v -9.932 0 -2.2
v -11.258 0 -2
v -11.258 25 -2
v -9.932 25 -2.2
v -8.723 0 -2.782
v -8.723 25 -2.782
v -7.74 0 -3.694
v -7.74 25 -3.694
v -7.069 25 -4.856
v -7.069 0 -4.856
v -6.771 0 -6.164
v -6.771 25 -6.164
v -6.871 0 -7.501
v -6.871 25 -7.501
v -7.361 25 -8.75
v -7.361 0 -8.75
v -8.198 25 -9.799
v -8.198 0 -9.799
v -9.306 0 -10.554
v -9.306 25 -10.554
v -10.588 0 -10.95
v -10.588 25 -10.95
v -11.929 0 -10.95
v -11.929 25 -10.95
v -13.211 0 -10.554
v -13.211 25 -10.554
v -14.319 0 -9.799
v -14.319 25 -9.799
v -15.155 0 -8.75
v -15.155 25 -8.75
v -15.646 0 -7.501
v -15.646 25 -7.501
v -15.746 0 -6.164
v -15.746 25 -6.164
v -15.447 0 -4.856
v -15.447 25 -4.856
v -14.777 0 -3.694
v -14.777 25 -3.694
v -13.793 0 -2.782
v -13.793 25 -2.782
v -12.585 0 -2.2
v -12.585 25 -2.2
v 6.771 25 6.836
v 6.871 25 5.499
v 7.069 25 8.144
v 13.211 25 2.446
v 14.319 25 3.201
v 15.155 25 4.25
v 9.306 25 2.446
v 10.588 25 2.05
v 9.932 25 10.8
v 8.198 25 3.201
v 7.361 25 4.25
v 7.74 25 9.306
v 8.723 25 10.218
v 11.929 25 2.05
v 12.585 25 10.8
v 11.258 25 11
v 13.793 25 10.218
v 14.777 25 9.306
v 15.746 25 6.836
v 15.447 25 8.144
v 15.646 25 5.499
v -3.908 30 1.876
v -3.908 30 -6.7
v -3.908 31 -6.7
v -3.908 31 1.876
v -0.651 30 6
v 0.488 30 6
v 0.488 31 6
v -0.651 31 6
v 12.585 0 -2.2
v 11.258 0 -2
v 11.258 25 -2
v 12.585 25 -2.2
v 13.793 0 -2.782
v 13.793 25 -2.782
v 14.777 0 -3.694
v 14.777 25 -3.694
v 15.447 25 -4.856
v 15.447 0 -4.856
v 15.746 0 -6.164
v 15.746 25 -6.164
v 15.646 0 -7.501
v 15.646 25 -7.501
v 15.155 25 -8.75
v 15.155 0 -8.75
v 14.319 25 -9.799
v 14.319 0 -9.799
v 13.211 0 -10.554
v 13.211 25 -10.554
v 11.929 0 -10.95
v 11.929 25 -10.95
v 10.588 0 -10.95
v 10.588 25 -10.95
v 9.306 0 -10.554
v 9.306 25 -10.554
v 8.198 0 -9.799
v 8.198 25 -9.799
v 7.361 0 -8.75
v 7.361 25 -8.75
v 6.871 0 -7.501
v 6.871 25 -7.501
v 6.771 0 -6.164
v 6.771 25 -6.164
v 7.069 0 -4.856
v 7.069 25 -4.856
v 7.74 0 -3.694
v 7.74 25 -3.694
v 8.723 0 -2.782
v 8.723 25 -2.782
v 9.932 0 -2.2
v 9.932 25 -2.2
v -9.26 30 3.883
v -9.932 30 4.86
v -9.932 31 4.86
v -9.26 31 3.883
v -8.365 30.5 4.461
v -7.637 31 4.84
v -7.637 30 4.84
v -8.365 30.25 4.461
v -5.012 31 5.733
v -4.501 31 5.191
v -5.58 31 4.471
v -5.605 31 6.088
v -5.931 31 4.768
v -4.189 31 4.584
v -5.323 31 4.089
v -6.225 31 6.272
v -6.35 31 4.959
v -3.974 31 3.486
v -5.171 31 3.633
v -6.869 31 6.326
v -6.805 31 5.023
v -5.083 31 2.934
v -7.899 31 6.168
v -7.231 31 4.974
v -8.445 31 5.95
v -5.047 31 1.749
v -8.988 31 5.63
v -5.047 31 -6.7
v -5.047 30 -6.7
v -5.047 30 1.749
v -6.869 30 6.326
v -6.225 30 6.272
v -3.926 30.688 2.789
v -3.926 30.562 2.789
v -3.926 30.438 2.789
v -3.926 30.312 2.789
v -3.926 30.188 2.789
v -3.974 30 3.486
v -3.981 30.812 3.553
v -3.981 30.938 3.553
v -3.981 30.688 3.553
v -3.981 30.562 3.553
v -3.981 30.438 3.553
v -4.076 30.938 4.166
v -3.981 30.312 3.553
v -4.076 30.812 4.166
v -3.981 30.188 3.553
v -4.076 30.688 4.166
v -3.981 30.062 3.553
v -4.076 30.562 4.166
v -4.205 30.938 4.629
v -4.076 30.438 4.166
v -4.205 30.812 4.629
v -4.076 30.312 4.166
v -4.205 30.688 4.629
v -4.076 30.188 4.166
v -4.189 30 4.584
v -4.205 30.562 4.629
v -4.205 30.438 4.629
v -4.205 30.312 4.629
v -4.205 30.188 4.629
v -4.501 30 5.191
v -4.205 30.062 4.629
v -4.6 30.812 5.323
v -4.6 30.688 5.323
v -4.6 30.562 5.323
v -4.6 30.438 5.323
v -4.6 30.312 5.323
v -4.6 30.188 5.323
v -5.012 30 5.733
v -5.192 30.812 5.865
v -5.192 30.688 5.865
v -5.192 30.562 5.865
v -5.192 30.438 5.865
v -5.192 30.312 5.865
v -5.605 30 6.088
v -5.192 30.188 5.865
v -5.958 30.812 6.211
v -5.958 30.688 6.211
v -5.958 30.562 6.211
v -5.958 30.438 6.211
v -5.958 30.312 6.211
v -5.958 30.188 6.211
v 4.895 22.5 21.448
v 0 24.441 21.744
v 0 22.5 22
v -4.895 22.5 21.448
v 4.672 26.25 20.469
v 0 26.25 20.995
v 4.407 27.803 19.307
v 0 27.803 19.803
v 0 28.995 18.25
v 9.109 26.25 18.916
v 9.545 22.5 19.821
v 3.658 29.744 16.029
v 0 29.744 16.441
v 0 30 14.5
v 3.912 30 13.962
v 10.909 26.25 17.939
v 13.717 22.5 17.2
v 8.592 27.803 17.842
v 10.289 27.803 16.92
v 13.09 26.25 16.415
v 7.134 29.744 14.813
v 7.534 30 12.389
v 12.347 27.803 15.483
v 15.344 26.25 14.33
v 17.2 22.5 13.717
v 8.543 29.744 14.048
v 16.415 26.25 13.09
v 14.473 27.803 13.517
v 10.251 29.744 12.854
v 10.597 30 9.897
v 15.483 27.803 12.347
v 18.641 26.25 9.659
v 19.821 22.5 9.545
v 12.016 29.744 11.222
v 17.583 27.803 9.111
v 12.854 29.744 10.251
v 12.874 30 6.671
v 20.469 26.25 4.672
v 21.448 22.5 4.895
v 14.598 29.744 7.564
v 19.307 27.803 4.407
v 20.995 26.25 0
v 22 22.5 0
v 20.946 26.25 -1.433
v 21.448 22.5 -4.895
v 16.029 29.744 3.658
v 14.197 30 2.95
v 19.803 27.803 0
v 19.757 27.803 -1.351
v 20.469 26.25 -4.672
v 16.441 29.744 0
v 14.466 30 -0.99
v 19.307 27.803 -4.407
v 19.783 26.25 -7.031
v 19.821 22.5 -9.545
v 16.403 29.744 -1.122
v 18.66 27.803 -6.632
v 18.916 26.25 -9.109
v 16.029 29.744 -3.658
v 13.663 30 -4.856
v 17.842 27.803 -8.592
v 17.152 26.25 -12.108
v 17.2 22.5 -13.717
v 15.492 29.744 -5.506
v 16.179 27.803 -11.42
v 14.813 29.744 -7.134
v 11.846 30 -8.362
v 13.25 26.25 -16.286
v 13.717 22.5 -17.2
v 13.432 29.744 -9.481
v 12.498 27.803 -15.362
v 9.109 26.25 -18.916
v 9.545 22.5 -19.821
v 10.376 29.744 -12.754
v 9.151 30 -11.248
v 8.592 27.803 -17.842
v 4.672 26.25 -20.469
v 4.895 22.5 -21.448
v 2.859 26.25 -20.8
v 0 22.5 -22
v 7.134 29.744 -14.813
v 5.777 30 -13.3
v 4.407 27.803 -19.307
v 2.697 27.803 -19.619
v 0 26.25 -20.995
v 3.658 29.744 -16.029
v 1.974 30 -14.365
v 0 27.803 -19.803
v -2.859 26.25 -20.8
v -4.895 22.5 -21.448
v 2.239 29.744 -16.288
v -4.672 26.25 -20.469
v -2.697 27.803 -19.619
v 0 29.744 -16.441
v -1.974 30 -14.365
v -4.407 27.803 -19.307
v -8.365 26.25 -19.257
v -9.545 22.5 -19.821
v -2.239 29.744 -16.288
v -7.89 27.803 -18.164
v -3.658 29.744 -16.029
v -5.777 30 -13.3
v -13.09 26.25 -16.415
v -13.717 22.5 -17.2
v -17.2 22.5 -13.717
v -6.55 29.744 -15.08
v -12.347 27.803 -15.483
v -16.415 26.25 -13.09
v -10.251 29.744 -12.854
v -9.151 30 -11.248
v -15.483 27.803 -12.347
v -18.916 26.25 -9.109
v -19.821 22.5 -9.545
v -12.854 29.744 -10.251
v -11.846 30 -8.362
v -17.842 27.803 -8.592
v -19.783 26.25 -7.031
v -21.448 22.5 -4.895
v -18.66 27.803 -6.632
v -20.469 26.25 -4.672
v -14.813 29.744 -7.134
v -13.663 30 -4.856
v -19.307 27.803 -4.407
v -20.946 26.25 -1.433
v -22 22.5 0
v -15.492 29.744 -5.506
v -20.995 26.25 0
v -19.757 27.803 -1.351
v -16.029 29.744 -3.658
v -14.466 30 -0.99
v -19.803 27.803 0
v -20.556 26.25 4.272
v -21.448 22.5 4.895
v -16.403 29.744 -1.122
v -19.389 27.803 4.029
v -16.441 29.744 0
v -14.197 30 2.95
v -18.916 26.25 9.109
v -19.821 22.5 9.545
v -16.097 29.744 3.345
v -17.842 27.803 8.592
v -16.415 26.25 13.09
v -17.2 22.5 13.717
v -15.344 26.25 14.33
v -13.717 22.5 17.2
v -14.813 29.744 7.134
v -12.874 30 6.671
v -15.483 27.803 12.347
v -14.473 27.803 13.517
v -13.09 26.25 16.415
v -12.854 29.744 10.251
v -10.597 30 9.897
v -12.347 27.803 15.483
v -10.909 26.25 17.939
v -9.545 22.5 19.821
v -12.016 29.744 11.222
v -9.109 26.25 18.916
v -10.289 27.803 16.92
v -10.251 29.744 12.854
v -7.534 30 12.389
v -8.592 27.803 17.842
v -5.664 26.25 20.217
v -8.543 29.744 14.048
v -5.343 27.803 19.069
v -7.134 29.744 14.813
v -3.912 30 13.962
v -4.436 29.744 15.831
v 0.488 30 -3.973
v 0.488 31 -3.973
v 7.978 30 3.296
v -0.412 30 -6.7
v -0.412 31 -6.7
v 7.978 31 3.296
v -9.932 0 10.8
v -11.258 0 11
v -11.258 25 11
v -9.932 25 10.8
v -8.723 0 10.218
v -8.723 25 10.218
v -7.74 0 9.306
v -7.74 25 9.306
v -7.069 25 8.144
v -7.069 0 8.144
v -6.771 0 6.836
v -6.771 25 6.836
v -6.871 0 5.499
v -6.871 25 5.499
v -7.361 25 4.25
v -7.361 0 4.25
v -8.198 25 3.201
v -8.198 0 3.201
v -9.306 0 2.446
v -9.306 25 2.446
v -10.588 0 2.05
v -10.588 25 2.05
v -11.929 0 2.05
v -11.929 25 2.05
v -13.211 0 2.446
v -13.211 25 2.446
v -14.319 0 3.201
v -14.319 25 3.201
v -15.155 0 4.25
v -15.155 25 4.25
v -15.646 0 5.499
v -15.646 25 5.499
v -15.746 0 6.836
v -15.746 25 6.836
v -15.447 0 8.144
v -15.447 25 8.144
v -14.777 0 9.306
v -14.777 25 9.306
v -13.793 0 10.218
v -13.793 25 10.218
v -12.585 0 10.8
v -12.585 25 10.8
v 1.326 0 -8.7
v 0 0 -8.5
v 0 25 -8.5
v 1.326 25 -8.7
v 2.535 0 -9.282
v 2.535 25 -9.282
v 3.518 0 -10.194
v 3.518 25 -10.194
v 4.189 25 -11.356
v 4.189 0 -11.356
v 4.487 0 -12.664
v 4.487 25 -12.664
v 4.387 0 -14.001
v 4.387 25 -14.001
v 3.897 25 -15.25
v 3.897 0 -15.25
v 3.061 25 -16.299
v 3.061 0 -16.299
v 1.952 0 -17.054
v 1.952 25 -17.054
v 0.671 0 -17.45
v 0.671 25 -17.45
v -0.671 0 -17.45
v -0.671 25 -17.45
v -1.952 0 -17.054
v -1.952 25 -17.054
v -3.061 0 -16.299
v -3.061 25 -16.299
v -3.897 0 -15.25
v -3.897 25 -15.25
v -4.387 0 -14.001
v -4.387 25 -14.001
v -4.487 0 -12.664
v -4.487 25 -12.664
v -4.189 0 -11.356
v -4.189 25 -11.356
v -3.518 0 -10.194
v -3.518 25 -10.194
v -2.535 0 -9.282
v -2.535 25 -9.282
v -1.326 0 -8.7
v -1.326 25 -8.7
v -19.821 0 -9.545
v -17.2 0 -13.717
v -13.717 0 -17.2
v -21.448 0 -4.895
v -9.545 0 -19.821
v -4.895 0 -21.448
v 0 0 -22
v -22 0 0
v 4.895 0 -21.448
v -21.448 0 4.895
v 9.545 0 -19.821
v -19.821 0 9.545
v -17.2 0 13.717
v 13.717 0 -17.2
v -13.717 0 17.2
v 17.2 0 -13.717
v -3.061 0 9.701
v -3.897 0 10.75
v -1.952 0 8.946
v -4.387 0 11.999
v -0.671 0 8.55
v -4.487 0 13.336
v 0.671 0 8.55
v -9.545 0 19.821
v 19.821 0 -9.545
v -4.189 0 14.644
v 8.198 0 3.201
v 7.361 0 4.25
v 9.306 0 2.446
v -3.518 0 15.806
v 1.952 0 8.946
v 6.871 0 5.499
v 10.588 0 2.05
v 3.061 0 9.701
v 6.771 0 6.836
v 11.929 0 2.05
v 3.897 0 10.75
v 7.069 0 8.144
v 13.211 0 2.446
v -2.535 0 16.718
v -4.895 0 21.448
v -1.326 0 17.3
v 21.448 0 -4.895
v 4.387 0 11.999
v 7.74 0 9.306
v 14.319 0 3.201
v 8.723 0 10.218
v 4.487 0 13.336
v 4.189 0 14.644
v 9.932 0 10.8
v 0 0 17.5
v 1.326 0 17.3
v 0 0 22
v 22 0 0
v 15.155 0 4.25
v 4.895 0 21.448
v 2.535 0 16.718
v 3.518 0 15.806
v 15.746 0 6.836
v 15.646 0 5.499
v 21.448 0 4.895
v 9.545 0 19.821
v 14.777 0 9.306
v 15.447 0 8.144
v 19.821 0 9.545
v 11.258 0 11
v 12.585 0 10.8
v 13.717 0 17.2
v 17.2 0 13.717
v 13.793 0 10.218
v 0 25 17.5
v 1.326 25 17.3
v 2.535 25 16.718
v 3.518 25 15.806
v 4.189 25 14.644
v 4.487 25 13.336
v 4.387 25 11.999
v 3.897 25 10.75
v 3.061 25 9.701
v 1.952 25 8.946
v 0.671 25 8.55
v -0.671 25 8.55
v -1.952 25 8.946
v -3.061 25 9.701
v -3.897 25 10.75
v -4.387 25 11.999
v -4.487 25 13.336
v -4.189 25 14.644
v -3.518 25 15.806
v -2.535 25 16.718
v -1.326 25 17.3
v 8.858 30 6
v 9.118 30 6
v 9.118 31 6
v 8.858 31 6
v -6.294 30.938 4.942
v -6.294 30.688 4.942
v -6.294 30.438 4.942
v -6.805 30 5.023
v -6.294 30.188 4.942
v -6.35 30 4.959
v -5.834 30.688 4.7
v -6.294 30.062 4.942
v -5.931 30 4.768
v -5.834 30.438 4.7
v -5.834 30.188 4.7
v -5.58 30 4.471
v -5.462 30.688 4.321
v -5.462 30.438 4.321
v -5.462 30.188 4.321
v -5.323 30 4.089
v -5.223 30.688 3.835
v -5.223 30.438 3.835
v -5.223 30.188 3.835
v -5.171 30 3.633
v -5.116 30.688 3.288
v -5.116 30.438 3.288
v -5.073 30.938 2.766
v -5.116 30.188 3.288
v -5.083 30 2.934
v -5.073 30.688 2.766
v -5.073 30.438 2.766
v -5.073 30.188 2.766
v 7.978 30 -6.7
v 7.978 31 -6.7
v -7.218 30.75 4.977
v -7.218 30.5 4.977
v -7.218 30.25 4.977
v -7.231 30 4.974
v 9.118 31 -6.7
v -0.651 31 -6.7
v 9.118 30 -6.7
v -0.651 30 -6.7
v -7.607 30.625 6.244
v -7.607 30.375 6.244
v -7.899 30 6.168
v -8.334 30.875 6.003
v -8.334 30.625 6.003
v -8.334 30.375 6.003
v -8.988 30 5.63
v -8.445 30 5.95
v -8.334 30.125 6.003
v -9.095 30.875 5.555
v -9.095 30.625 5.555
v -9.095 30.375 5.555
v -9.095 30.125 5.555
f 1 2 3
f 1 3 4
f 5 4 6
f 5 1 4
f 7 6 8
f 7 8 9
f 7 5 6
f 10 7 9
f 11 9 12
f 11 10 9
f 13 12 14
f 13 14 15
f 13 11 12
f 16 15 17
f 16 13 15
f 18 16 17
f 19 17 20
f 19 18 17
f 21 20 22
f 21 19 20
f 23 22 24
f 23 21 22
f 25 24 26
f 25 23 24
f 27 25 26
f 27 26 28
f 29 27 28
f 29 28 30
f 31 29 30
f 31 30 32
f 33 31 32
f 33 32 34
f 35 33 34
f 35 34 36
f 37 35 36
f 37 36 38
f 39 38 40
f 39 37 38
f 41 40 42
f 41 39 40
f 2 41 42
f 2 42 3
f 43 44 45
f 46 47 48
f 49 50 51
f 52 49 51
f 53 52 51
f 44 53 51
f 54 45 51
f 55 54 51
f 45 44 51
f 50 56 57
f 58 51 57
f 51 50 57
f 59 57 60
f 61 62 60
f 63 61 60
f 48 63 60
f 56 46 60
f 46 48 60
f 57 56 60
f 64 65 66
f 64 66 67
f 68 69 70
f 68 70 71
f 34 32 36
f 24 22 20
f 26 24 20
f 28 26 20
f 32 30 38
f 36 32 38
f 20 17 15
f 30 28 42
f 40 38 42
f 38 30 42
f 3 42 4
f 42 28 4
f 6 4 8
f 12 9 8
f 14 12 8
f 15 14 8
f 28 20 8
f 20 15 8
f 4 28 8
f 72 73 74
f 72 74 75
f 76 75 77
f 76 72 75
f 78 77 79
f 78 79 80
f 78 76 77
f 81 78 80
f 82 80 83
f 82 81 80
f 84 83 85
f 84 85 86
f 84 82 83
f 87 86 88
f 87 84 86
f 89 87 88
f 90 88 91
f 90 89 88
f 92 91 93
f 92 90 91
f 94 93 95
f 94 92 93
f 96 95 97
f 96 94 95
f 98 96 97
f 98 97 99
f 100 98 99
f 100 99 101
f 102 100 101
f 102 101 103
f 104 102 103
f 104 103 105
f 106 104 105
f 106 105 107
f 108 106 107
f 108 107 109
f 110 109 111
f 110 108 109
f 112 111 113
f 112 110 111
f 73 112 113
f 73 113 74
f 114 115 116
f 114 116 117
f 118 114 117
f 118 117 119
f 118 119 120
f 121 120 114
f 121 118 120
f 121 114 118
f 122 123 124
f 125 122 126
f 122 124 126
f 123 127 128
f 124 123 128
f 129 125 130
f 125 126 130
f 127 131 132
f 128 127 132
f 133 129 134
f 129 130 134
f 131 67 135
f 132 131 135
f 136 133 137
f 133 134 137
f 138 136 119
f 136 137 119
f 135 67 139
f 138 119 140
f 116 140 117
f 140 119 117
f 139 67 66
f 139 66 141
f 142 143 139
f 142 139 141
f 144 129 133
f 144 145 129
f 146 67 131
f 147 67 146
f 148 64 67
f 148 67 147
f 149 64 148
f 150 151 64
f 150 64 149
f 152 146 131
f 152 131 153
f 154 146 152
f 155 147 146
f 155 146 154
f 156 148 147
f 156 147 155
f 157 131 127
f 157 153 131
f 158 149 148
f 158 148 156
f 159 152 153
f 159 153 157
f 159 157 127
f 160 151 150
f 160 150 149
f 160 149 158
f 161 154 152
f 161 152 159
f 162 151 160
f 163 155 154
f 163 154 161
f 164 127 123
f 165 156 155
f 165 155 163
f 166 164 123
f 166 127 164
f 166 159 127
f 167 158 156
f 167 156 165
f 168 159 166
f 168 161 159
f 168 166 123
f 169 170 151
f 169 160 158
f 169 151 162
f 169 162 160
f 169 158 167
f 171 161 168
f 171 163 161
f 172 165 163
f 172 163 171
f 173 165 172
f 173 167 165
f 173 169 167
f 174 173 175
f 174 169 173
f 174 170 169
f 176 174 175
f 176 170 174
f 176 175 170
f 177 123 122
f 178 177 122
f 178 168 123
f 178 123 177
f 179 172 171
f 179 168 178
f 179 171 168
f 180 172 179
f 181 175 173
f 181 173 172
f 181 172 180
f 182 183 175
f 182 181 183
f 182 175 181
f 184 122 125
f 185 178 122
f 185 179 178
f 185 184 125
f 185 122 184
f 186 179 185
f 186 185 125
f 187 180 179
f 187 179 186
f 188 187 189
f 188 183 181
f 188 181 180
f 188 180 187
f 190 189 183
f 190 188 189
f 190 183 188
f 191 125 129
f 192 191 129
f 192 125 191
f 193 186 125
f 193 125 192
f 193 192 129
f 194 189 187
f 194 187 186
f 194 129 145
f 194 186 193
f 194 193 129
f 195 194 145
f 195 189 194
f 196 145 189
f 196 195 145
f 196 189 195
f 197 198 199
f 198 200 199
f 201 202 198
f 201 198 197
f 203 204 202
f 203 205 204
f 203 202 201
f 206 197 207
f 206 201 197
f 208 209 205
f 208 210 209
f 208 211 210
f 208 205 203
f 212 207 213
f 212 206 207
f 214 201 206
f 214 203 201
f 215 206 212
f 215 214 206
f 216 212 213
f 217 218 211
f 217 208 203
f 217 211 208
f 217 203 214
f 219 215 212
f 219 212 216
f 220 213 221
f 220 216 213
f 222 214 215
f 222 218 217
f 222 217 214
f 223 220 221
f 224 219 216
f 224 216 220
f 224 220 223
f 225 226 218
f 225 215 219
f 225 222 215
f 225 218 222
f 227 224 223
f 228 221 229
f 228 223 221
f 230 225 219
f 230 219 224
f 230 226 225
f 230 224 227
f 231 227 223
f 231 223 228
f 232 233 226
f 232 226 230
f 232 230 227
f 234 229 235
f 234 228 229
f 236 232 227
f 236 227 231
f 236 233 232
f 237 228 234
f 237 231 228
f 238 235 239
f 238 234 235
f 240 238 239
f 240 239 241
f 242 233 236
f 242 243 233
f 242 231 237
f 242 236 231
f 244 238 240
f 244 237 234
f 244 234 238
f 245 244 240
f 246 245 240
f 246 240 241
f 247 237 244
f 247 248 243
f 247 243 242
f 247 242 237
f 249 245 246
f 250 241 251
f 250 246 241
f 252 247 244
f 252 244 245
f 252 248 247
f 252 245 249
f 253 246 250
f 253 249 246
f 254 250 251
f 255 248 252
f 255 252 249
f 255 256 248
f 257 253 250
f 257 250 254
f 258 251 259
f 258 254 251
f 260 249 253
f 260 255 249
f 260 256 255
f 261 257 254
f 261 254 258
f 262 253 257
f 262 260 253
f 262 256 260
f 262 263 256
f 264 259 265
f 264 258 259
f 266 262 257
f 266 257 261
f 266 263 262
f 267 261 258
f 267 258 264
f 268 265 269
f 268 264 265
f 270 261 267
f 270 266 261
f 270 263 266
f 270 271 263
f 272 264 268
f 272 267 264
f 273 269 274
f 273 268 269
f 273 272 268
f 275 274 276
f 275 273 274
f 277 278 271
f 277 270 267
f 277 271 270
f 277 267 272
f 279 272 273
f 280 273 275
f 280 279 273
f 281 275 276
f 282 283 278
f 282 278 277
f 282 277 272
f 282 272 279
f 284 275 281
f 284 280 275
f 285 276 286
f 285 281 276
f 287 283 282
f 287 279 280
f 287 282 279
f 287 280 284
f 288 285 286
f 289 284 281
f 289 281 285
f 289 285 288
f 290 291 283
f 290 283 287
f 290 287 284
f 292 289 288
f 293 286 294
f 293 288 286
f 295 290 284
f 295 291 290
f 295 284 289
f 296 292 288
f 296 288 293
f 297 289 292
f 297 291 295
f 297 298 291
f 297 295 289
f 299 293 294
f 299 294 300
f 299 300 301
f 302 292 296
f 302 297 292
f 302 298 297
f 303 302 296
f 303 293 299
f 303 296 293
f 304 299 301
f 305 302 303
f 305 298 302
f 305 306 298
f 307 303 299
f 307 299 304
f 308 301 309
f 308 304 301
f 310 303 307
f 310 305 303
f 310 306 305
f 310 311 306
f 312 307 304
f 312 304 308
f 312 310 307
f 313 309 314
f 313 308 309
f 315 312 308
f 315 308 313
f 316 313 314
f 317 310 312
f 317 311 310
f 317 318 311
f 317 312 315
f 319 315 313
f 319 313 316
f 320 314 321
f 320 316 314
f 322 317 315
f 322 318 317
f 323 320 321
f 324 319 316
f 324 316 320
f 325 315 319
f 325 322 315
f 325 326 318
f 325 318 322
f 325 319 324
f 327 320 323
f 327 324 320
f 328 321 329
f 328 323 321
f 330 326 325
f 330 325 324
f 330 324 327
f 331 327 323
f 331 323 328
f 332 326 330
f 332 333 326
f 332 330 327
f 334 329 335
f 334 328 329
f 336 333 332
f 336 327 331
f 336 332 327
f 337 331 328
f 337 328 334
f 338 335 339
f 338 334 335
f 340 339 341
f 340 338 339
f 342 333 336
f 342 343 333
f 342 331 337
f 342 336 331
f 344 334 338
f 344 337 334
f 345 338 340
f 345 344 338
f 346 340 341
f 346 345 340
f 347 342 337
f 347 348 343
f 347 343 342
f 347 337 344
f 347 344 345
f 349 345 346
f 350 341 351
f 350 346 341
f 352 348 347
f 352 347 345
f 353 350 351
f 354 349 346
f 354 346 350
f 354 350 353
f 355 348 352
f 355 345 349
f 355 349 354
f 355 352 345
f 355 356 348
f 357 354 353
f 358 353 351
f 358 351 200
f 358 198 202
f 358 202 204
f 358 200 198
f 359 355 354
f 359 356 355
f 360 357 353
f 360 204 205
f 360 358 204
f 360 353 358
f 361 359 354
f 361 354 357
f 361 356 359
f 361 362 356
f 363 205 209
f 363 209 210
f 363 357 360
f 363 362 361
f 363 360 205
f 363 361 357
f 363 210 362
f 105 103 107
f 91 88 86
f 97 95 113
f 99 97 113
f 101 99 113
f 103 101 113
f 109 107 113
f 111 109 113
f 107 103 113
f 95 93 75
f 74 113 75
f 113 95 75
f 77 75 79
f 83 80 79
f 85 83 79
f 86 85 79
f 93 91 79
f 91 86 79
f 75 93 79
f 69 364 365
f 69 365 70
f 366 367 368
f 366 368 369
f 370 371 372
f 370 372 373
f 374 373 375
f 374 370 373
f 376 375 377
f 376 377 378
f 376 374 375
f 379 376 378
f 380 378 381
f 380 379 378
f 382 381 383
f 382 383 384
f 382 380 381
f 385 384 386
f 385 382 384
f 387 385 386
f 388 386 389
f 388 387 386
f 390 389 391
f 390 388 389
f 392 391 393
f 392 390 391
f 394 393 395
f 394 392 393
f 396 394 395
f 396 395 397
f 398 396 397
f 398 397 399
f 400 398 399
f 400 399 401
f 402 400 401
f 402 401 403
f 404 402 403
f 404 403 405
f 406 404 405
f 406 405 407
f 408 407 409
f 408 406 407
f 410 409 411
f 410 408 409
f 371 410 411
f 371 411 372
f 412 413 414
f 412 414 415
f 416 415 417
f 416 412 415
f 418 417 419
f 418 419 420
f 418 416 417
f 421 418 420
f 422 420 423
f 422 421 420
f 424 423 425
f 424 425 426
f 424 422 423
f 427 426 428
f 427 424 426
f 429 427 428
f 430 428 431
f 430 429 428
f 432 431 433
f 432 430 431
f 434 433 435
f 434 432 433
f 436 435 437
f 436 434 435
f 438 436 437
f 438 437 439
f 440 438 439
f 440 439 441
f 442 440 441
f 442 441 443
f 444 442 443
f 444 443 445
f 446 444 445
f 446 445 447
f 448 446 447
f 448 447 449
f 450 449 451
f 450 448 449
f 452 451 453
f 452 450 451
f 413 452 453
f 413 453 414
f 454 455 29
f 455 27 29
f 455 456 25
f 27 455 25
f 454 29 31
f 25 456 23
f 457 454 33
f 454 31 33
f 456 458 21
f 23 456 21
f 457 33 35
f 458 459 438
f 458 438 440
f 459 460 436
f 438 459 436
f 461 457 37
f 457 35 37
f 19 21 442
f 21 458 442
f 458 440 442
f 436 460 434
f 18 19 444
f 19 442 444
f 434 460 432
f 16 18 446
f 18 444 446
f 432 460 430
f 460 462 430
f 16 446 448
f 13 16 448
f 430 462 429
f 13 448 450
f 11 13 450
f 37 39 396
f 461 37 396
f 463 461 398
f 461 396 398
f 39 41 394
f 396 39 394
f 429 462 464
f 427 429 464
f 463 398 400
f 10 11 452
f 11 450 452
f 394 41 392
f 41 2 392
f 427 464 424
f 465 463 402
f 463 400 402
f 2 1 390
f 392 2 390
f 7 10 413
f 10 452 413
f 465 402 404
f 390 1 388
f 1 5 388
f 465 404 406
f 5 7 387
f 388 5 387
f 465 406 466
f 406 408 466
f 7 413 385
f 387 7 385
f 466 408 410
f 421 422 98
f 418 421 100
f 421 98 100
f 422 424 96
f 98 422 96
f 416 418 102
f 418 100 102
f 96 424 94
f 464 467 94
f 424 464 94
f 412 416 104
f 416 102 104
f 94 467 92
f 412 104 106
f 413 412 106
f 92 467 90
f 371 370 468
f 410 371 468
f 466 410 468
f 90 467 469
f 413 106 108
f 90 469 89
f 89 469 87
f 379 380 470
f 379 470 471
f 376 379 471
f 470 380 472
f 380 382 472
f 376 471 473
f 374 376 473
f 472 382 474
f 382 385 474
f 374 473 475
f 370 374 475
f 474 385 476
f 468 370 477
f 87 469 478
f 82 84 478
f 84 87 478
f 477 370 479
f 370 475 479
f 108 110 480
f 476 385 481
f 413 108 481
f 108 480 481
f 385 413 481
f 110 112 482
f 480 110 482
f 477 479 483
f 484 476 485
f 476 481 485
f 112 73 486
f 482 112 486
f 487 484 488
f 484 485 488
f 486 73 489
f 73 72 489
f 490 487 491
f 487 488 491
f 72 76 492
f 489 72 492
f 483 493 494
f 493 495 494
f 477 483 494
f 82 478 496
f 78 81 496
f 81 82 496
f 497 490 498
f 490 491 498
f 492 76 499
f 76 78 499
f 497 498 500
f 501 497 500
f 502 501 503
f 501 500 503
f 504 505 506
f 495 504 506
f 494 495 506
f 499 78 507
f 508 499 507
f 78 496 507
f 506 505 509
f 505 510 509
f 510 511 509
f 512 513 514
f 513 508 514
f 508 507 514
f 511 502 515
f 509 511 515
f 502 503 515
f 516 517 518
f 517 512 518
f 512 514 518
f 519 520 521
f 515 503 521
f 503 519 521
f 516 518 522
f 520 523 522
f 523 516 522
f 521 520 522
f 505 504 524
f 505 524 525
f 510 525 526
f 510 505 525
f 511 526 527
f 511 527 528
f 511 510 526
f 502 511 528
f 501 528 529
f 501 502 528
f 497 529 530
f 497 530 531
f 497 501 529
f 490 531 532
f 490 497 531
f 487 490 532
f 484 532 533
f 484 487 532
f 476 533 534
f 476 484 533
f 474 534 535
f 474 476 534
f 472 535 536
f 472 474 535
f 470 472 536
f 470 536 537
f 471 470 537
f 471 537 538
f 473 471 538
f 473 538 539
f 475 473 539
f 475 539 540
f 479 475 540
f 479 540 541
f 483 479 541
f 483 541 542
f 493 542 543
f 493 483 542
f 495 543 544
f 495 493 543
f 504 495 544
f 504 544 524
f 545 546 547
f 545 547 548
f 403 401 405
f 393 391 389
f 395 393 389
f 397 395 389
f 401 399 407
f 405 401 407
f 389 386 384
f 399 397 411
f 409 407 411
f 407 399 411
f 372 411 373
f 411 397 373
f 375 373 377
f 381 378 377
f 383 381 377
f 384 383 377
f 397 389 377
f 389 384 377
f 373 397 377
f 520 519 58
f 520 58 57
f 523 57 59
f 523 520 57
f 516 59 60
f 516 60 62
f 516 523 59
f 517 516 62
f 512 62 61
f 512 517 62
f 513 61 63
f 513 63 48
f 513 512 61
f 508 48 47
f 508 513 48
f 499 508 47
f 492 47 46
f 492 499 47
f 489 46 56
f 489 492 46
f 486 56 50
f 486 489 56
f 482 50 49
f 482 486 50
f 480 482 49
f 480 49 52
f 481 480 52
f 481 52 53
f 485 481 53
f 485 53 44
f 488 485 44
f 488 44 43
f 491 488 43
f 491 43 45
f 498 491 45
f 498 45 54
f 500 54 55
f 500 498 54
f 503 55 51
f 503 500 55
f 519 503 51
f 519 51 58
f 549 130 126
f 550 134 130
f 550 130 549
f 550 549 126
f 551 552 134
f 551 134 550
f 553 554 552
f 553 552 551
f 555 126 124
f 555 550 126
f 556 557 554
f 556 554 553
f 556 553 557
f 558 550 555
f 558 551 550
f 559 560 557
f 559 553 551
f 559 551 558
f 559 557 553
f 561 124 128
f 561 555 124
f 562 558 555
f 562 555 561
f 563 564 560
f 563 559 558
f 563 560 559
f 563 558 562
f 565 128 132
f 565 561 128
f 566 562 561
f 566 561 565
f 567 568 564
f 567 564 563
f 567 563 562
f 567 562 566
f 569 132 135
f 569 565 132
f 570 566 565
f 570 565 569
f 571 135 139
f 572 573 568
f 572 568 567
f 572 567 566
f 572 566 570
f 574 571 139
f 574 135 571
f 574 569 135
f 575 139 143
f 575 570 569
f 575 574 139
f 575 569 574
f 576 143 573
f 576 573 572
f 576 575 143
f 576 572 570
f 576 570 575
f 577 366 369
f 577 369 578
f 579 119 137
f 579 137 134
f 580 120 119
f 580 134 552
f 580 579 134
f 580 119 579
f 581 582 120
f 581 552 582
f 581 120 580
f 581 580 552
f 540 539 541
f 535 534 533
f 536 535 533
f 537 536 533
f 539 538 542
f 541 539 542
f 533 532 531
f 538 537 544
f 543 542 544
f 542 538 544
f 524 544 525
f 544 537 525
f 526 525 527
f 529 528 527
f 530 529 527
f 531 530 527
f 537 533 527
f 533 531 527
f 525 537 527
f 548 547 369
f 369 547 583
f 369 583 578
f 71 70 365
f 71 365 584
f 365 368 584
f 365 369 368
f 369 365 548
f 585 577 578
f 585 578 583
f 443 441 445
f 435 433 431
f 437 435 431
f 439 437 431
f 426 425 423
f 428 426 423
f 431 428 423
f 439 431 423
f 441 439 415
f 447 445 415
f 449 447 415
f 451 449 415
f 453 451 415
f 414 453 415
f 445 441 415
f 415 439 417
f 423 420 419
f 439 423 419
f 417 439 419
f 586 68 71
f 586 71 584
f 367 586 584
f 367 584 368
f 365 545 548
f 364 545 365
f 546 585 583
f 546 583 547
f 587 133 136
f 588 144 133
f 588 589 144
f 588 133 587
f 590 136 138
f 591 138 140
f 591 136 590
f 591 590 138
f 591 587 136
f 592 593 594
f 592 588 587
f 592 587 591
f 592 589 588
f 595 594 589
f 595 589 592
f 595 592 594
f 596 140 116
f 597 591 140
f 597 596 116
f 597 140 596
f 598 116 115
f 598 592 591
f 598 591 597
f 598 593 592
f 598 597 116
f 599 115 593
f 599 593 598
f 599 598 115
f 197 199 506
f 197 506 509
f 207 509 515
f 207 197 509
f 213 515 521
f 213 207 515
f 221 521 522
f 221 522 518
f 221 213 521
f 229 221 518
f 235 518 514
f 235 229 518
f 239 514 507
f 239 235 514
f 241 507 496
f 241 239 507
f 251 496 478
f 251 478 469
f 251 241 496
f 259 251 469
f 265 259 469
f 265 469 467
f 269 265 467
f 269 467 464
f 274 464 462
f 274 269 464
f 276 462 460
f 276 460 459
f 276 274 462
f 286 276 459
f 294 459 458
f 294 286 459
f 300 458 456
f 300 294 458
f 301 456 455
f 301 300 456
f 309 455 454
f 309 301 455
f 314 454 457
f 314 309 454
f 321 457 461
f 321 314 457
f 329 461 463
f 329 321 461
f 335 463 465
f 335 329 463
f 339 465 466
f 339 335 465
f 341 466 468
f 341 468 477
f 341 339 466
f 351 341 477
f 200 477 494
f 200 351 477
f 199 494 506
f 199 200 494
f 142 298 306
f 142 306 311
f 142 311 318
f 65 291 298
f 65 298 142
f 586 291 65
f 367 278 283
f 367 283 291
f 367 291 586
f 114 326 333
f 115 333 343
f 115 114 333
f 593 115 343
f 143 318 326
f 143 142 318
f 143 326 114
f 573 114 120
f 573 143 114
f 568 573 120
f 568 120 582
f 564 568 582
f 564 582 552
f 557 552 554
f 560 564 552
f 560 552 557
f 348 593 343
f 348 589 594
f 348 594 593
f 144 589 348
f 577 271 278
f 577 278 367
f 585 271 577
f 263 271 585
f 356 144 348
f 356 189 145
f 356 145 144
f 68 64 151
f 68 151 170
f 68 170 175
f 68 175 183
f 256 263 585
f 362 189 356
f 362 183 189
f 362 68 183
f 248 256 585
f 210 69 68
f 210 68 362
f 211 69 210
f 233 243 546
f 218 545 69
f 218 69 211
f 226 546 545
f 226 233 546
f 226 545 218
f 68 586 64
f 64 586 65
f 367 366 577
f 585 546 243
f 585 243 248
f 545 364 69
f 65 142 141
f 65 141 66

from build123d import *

# Parameters (mm, degrees)
SKETCH2_R           = 22
BOSS_EXTRUDE3_DEPTH = 30
SKETCH1_R           = 4.5
CUT_EXTRUDE2_DEPTH  = 25
FILLET1_R           = 7.5
BOSS_EXTRUDE4_DEPTH = 1


with BuildPart() as part:
    # Sketch2 → Boss-Extrude3 (new body)
    with BuildSketch(Plane(origin=(0, 30, 0), x_dir=(1, 0, 0), z_dir=(0, 1, 0))):
        with Locations(Location((0, 0, 0), (0, 0, 270))):
            Circle(SKETCH2_R)
    extrude(amount=-BOSS_EXTRUDE3_DEPTH)

    # Sketch1 → Cut-Extrude2 (cut)
    with BuildSketch(Plane(origin=(0, 0, 0), x_dir=(1, 0, 0), z_dir=(0, 1, 0))):
        with Locations(Location((0, 13, 0), (0, 0, 270))):
            Circle(SKETCH1_R)
        with Locations(Location((-11.258330249, 6.5, 0), (0, 0, 270))):
            Circle(SKETCH1_R)
        with Locations(Location((-11.258330249, -6.5, 0), (0, 0, 270))):
            Circle(SKETCH1_R)
        with Locations(Location((11.258330249, 6.5, 0), (0, 0, 270))):
            Circle(SKETCH1_R)
        with Locations(Location((11.258330249, -6.5, 0), (0, 0, 270))):
            Circle(SKETCH1_R)
        with Locations(Location((0, -13, 0), (0, 0, 270))):
            Circle(SKETCH1_R)
    extrude(amount=CUT_EXTRUDE2_DEPTH, mode=Mode.SUBTRACT)

    # Fillet1
    fillet1_edges = [part.edges().sort_by_distance(p)[0] for p in [
        (0, 30, -22),
    ]]
    fillet(fillet1_edges, radius=FILLET1_R)

    # Sketch3 → Boss-Extrude4 (add)
    with BuildSketch(Plane(origin=(0, 30, 0), x_dir=(1, 0, 0), z_dir=(0, 1, 0))):
        with BuildLine():
            Line((-5.047435897, 6.7), (-3.907692308, 6.7))
            Line((-3.907692308, 6.7), (-3.907692308, -1.876061699))
            add(Edge.make_bspline(
                [(-3.907692308, -1.876061699), (-3.908831384, -2.034649033), (-3.911018549, -2.339156067), (-3.923045124, -2.777755632), (-3.945300887, -3.17824355), (-3.977722218, -3.541530486), (-4.020975634, -3.86647833), (-4.070473079, -4.155597886), (-4.130390949, -4.406476162), (-4.220620698, -4.688181596), (-4.368571883, -4.997131973), (-4.591246564, -5.330797805), (-4.867862712, -5.622656181), (-5.188269318, -5.876121783), (-5.555266748, -6.078078021), (-5.961297429, -6.22305824), (-6.403861903, -6.311489634), (-6.710836188, -6.320829233), (-6.868990385, -6.325641026)],
                knots=[0, 0, 0, 0, 1.237770943, 2.376671248, 3.424123796, 4.367912054, 5.222547132, 5.982086412, 6.656319012, 7.234008312, 8.288027371, 9.317870876, 10.352700517, 11.413286737, 12.494591526, 13.606319346, 14.766767577, 16, 16, 16, 16], degree=3))
            add(Edge.make_bspline(
                [(-6.868990385, -6.325641026), (-6.992210713, -6.321719958), (-7.240138175, -6.313830511), (-7.609130176, -6.249526009), (-7.977074488, -6.150407795), (-8.345924031, -6.00525552), (-8.722966135, -5.80784092), (-9.113307336, -5.549541728), (-9.521968629, -5.230838761), (-9.791147982, -4.987587513), (-9.932051282, -4.86025641)],
                knots=[0, 0, 0, 0, 0.848567217, 1.707373443, 2.573483905, 3.470863513, 4.432650262, 5.500696352, 6.691726801, 8, 8, 8, 8], degree=3))
            Line((-9.932051282, -4.86025641), (-9.260416667, -3.883333333))
            add(Edge.make_bspline(
                [(-9.260416667, -3.883333333), (-9.105466946, -3.990185314), (-8.812901668, -4.191935786), (-8.38289984, -4.451475164), (-8.00191017, -4.673997908), (-7.75268919, -4.787399035), (-7.637299679, -4.839903846)],
                knots=[0, 0, 0, 0, 1.196737151, 2.259595785, 3.194191475, 4, 4, 4, 4], degree=3))
            add(Edge.make_bspline(
                [(-7.637299679, -4.839903846), (-7.567325178, -4.867333877), (-7.430089597, -4.921130276), (-7.220267165, -4.98116825), (-7.011642317, -5.01397928), (-6.873329542, -5.020080117), (-6.805388622, -5.023076923)],
                knots=[0, 0, 0, 0, 1.051806502, 2.062826769, 3.048436908, 4, 4, 4, 4], degree=3))
            add(Edge.make_bspline(
                [(-6.805388622, -5.023076923), (-6.717639647, -5.019365856), (-6.544192277, -5.012030446), (-6.292137213, -4.947263075), (-6.050989499, -4.848404813), (-5.829393884, -4.703656404), (-5.625158337, -4.531548106), (-5.456637227, -4.323427732), (-5.31614894, -4.092774019), (-5.231604338, -3.8744376), (-5.177739023, -3.675313828), (-5.143551977, -3.492313592), (-5.113657409, -3.278367655), (-5.087598635, -3.033220643), (-5.072342413, -2.756381753), (-5.055225452, -2.448663863), (-5.049037791, -2.109291153), (-5.047986155, -1.872668556), (-5.047435897, -1.748858173)],
                knots=[0, 0, 0, 0, 0.997221856, 1.971139923, 2.944579524, 3.951425367, 4.971190333, 5.972282193, 6.985401279, 8.033996657, 8.624075553, 9.332086008, 10.151144245, 11.082816738, 12.137127781, 13.306538797, 14.590673636, 16, 16, 16, 16], degree=3))
            Line((-5.047435897, -1.748858173), (-5.047435897, 6.7))
        make_face()
        Polygon((-0.651282051, -6), (-0.651282051, 6.7), (-0.412139423, 6.7), (7.978205128, -3.295653045), (7.978205128, 6.7), (9.117948718, 6.7), (9.117948718, -6), (8.858453526, -6), (0.488461538, 3.97275641), (0.488461538, -6), align=None)
    extrude(amount=BOSS_EXTRUDE4_DEPTH)


solid = part.part
